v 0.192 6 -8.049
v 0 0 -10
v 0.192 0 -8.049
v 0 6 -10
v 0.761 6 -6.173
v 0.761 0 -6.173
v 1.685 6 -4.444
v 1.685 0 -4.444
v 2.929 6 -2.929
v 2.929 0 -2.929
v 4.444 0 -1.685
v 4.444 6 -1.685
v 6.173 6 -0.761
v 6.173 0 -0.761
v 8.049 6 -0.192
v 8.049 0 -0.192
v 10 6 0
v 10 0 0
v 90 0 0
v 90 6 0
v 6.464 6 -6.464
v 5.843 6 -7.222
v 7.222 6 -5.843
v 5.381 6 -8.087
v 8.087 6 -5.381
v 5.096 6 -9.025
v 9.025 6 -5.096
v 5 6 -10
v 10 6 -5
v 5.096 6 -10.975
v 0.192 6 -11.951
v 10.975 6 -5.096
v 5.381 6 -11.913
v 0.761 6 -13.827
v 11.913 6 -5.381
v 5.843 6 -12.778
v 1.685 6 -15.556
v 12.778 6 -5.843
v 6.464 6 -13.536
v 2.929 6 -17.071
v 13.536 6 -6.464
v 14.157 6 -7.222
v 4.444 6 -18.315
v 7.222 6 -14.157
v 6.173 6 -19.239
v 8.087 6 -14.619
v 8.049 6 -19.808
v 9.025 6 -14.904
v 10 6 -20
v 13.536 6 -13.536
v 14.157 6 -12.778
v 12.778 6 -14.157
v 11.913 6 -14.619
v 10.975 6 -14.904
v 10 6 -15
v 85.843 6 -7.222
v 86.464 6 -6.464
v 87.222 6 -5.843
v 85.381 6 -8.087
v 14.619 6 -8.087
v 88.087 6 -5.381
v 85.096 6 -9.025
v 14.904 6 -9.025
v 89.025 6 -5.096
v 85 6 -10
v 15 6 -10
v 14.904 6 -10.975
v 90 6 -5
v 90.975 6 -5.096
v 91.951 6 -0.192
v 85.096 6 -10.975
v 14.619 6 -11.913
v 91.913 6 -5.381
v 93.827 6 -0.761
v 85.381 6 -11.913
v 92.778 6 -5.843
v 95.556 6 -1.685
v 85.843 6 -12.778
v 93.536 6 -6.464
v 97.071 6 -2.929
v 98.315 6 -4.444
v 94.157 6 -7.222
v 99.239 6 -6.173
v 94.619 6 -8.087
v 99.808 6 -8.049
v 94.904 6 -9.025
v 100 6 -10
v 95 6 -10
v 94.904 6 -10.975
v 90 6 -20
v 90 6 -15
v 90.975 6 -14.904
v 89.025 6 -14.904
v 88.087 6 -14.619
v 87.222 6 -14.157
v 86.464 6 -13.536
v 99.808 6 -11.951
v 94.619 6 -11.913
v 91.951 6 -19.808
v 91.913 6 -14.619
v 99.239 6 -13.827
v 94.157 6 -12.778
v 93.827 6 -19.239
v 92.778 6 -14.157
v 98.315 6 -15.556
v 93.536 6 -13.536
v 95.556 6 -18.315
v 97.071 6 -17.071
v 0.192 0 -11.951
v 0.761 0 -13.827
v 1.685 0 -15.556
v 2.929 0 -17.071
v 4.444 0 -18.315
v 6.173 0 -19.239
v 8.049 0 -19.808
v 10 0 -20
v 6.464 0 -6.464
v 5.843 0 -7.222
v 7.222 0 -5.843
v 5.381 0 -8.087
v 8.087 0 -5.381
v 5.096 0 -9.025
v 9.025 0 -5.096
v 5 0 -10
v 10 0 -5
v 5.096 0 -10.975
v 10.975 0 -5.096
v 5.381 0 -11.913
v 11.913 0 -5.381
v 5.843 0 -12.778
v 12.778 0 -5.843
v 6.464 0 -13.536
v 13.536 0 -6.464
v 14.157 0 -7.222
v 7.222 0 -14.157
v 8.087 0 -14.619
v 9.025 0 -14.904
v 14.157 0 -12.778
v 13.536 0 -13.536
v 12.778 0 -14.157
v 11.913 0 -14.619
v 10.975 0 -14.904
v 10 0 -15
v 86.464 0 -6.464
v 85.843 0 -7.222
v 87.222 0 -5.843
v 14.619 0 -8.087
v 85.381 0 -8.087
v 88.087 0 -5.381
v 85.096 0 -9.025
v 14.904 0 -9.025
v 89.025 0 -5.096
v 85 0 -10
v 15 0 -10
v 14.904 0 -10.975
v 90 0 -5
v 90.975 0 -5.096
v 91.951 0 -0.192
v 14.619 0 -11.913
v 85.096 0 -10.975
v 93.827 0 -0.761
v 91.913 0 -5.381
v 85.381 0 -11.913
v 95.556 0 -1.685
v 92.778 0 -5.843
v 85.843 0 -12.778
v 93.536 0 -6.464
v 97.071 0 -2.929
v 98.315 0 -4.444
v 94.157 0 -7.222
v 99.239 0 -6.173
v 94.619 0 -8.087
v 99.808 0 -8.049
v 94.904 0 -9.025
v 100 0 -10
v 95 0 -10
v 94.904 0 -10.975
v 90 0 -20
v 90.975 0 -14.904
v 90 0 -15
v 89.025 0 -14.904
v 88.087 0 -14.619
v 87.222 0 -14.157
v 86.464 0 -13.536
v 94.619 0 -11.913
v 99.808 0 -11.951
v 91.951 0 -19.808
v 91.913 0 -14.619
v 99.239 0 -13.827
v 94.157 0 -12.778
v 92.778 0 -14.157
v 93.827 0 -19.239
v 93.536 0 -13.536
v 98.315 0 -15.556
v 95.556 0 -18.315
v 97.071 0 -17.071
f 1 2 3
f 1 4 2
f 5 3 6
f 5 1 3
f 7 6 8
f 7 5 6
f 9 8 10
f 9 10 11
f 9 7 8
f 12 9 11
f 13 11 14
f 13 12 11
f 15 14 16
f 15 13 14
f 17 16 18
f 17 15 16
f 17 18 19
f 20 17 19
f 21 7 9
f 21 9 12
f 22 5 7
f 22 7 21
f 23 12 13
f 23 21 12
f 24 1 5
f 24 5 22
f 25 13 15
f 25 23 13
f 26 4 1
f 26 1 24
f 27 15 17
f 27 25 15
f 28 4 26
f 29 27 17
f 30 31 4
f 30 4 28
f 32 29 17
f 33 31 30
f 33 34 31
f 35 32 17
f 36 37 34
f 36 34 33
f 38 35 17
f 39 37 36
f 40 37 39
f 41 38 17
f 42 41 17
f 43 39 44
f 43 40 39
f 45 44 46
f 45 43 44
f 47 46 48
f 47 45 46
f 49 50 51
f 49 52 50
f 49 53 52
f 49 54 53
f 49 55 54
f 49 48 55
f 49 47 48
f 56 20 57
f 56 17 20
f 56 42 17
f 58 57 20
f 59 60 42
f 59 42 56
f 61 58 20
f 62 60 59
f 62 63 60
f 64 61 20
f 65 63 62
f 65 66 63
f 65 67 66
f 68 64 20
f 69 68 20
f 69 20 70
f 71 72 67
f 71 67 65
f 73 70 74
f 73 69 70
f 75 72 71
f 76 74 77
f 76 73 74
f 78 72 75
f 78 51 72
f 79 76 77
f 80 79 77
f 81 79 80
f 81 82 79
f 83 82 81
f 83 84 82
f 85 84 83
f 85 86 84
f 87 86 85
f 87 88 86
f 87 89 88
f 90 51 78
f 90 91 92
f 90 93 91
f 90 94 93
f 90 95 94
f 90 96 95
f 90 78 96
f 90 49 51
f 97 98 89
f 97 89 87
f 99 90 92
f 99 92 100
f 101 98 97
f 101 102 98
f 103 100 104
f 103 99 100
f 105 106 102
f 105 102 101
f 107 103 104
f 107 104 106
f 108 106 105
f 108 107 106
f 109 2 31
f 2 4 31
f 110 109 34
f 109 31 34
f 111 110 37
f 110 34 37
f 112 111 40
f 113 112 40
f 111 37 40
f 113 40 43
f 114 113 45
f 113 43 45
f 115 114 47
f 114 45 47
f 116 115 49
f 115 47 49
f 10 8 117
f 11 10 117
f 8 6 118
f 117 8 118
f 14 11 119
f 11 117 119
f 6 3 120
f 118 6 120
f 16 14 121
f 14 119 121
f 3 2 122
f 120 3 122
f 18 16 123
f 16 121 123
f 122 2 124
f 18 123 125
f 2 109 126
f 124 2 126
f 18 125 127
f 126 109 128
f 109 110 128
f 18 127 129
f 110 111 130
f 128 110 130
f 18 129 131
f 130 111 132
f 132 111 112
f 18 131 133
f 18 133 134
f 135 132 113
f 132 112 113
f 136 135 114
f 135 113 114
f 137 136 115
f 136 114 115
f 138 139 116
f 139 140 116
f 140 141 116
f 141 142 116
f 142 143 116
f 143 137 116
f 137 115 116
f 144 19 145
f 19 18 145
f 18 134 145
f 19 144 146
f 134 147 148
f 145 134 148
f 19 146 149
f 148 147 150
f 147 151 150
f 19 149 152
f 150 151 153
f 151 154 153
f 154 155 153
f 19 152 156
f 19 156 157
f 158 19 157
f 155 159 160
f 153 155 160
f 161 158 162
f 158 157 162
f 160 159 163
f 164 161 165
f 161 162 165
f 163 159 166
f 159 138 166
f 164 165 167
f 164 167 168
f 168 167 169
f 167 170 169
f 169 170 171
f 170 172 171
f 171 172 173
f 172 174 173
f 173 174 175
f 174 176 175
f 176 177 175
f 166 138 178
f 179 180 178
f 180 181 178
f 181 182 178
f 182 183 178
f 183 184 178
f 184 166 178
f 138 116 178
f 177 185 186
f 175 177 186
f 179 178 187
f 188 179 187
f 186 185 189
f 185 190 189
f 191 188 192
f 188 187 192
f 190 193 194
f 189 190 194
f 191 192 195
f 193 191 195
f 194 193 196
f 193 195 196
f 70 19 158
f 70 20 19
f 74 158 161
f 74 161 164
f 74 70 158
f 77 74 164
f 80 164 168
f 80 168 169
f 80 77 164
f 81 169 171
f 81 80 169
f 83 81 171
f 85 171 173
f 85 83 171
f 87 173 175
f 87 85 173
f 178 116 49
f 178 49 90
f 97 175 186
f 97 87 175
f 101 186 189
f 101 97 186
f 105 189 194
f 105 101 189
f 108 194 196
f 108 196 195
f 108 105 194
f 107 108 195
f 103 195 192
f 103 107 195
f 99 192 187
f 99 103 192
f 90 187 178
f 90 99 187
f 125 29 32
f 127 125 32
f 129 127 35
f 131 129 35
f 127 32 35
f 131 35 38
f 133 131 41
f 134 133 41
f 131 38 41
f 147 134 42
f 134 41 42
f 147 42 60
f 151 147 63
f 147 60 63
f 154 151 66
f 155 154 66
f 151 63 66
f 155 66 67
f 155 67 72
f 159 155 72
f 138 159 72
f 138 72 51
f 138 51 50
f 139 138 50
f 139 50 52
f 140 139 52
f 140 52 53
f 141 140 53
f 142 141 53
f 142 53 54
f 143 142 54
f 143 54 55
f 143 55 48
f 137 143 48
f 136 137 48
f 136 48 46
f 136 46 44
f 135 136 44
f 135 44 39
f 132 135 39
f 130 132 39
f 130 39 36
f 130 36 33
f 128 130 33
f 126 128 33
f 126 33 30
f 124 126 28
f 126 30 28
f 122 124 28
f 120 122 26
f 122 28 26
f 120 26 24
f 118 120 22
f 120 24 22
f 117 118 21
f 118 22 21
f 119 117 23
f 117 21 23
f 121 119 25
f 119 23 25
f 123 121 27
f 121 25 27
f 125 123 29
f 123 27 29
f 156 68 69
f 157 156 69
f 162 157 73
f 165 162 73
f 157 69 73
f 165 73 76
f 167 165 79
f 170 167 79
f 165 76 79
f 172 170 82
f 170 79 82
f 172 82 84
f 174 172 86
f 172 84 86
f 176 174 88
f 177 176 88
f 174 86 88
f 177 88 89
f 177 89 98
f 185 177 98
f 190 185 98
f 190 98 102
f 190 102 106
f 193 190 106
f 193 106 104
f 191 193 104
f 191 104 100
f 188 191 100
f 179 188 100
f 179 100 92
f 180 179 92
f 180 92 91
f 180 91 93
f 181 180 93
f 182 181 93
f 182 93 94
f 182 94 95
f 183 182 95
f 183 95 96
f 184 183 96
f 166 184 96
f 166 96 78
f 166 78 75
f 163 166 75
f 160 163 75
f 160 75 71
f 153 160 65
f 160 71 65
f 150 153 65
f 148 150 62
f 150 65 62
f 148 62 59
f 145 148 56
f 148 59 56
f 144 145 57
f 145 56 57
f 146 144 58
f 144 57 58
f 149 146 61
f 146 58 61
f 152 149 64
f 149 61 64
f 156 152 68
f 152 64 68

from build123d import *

# Parameters (mm, degrees)
SKETCH1_W           = 100
SKETCH1_H           = 20
BOSS_EXTRUDE1_DEPTH = 6
FILLET1_R           = 10
SKETCH2_R           = 5
CUT_EXTRUDE1_DEPTH  = 103.156742313


with BuildPart() as part:
    # Sketch1 → Boss-Extrude1 (new body)
    with BuildSketch(Plane(origin=(0, 0, 0), x_dir=(1, 0, 0), z_dir=(0, 1, 0))):
        with Locations((50, 10)):
            Rectangle(SKETCH1_W, SKETCH1_H)
    extrude(amount=BOSS_EXTRUDE1_DEPTH)

    # Fillet1
    fillet1_edges = [part.edges().sort_by_distance(p)[0] for p in [
        (100, 3, -20),
        (100, 3, 0),
        (0, 3, -20),
        (0, 3, 0),
    ]]
    fillet(fillet1_edges, radius=FILLET1_R - 0.0001)  # a hair under: the kernel refuses the full size

    # Sketch2 → Cut-Extrude1 (cut, through all)
    with BuildSketch(Plane(origin=(0, 6, 0), x_dir=(1, 0, 0), z_dir=(0, 1, 0))):
        with Locations(Location((10, 10, 0), (0, 0, 270))):
            Circle(SKETCH2_R)
        with Locations(Location((90, 10, 0), (0, 0, 270))):
            Circle(SKETCH2_R)
    extrude(amount=-CUT_EXTRUDE1_DEPTH, mode=Mode.SUBTRACT)


solid = part.part
